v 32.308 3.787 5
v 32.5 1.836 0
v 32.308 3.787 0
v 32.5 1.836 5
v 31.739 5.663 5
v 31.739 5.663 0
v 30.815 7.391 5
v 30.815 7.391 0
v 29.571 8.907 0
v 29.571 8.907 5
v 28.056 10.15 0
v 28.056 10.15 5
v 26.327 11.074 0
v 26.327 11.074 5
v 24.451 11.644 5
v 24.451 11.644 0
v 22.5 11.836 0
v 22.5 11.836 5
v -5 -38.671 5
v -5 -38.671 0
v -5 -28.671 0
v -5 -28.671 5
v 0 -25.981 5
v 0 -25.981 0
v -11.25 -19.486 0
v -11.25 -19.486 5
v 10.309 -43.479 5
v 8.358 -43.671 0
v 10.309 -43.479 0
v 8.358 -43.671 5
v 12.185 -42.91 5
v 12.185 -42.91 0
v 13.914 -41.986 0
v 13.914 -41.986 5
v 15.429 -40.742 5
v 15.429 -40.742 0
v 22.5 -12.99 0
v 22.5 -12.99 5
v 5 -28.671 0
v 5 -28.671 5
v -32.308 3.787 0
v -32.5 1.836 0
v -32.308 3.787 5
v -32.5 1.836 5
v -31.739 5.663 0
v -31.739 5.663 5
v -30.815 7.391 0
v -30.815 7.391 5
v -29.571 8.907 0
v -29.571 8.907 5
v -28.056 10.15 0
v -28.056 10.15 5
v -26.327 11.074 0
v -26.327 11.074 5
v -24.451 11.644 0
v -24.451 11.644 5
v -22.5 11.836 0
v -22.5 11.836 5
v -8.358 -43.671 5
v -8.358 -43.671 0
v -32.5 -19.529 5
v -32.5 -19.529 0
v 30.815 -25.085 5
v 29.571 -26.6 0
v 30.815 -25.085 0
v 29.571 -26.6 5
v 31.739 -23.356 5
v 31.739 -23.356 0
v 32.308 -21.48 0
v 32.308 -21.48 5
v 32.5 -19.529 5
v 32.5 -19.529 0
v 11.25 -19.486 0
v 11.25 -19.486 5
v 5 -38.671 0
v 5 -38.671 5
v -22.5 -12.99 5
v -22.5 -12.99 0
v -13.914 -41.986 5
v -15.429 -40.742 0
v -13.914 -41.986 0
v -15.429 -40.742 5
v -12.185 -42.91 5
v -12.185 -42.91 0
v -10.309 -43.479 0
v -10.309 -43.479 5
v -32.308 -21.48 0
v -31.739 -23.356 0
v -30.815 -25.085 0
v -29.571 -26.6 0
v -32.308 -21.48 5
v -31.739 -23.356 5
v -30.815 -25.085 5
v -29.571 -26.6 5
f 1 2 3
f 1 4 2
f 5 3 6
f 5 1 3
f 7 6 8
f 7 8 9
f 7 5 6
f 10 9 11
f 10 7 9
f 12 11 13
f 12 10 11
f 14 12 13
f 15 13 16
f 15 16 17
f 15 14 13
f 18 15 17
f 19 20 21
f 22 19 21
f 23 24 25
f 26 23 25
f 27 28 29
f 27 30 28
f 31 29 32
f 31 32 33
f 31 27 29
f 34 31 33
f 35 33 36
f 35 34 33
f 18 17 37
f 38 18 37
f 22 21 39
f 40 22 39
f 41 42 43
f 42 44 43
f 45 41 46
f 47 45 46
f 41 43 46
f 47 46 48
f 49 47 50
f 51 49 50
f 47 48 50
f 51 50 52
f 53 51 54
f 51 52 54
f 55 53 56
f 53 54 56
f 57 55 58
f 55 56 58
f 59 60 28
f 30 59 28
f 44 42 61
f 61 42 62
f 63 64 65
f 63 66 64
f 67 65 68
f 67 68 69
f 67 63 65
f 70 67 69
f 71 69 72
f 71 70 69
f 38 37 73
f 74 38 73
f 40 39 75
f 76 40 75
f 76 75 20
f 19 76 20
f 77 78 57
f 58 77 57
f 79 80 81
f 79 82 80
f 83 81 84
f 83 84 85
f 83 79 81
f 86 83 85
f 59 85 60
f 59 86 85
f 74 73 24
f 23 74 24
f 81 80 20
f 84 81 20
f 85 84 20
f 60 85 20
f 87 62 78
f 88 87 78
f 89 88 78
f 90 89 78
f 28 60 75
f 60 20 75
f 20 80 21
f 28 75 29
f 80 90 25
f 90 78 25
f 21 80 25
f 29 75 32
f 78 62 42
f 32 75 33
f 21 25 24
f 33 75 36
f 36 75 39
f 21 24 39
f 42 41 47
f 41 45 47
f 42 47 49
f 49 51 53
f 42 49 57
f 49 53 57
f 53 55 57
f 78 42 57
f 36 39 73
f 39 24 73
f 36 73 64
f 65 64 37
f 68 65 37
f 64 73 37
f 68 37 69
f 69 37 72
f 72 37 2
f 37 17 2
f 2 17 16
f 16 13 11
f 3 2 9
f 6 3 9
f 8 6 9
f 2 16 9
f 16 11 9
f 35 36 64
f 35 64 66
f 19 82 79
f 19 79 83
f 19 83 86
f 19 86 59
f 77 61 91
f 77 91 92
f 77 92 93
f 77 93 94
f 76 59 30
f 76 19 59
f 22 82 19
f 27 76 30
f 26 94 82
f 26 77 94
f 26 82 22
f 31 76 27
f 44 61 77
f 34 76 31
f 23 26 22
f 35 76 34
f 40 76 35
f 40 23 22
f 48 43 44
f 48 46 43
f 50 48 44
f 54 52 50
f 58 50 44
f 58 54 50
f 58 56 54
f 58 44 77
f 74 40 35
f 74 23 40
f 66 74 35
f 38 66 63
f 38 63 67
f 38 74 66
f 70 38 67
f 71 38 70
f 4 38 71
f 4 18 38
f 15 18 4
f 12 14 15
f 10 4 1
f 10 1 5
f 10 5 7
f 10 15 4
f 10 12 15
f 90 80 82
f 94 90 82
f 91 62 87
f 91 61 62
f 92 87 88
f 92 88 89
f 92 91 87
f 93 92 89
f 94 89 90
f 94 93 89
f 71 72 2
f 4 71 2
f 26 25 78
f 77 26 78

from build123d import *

# Parameters (mm, degrees)
F1_DEPTH = 5
F2_SIZE  = 20
F3_R     = 9.99999


# Not quite as in the source:
# - a fillet or chamfer is up to 0.001 mm smaller than in the source, because OpenCascade refuses the exact size
# - a feature names something its author has since deleted; it is built from what else it names


with BuildPart() as f1:
    # F0 (on Top) → F1 (new body)
    with BuildSketch(Plane.XY):
        Polygon((0, -28.6713610368), (0, -25.9807621135), (-11.250000041, -19.4855715615), (-22.5, -12.9903810568), (-22.5, 0), (-22.5, 11.8356805184), (-32.5, 11.8356805184), (-32.5, -43.6713610368), (0, -43.6713610368), (0, -38.6713610368), (-5, -38.6713610368), (-5, -28.6713610368), align=None)
        Polygon((11.2499998166, -19.485571691), (0, -25.9807621135), (0, -28.6713610368), (5, -28.6713610368), (5, -38.6713610368), (0, -38.6713610368), (0, -43.6713610368), (32.5, -43.6713610368), (32.5, 11.8356805184), (22.5, 11.8356805184), (22.5, 0), (22.5, -12.9903810568), align=None)
    extrude(amount=F1_DEPTH)

    # F2
    f2_edges = [f1.edges().sort_by_distance(p)[0] for p in [
        (-32.5, -43.671361, 2.5),
        (32.5, -43.671361, 2.5),
    ]]
    chamfer(f2_edges, length=F2_SIZE)

    # F3 (radius 10 in the source; OpenCascade refuses exactly that, so slightly less here)
    f3_edges = [f1.edges().sort_by_distance(p)[0] for p in [
        (-32.5, 11.835681, 2.5),
        (32.5, -23.671361, 2.5),
        (32.5, 11.835681, 2.5),
        (12.5, -43.671361, 2.5),
        (-12.5, -43.671361, 2.5),
        (-32.5, -23.671361, 2.5),
    ]]
    fillet(f3_edges, radius=F3_R)


solid = f1.part
